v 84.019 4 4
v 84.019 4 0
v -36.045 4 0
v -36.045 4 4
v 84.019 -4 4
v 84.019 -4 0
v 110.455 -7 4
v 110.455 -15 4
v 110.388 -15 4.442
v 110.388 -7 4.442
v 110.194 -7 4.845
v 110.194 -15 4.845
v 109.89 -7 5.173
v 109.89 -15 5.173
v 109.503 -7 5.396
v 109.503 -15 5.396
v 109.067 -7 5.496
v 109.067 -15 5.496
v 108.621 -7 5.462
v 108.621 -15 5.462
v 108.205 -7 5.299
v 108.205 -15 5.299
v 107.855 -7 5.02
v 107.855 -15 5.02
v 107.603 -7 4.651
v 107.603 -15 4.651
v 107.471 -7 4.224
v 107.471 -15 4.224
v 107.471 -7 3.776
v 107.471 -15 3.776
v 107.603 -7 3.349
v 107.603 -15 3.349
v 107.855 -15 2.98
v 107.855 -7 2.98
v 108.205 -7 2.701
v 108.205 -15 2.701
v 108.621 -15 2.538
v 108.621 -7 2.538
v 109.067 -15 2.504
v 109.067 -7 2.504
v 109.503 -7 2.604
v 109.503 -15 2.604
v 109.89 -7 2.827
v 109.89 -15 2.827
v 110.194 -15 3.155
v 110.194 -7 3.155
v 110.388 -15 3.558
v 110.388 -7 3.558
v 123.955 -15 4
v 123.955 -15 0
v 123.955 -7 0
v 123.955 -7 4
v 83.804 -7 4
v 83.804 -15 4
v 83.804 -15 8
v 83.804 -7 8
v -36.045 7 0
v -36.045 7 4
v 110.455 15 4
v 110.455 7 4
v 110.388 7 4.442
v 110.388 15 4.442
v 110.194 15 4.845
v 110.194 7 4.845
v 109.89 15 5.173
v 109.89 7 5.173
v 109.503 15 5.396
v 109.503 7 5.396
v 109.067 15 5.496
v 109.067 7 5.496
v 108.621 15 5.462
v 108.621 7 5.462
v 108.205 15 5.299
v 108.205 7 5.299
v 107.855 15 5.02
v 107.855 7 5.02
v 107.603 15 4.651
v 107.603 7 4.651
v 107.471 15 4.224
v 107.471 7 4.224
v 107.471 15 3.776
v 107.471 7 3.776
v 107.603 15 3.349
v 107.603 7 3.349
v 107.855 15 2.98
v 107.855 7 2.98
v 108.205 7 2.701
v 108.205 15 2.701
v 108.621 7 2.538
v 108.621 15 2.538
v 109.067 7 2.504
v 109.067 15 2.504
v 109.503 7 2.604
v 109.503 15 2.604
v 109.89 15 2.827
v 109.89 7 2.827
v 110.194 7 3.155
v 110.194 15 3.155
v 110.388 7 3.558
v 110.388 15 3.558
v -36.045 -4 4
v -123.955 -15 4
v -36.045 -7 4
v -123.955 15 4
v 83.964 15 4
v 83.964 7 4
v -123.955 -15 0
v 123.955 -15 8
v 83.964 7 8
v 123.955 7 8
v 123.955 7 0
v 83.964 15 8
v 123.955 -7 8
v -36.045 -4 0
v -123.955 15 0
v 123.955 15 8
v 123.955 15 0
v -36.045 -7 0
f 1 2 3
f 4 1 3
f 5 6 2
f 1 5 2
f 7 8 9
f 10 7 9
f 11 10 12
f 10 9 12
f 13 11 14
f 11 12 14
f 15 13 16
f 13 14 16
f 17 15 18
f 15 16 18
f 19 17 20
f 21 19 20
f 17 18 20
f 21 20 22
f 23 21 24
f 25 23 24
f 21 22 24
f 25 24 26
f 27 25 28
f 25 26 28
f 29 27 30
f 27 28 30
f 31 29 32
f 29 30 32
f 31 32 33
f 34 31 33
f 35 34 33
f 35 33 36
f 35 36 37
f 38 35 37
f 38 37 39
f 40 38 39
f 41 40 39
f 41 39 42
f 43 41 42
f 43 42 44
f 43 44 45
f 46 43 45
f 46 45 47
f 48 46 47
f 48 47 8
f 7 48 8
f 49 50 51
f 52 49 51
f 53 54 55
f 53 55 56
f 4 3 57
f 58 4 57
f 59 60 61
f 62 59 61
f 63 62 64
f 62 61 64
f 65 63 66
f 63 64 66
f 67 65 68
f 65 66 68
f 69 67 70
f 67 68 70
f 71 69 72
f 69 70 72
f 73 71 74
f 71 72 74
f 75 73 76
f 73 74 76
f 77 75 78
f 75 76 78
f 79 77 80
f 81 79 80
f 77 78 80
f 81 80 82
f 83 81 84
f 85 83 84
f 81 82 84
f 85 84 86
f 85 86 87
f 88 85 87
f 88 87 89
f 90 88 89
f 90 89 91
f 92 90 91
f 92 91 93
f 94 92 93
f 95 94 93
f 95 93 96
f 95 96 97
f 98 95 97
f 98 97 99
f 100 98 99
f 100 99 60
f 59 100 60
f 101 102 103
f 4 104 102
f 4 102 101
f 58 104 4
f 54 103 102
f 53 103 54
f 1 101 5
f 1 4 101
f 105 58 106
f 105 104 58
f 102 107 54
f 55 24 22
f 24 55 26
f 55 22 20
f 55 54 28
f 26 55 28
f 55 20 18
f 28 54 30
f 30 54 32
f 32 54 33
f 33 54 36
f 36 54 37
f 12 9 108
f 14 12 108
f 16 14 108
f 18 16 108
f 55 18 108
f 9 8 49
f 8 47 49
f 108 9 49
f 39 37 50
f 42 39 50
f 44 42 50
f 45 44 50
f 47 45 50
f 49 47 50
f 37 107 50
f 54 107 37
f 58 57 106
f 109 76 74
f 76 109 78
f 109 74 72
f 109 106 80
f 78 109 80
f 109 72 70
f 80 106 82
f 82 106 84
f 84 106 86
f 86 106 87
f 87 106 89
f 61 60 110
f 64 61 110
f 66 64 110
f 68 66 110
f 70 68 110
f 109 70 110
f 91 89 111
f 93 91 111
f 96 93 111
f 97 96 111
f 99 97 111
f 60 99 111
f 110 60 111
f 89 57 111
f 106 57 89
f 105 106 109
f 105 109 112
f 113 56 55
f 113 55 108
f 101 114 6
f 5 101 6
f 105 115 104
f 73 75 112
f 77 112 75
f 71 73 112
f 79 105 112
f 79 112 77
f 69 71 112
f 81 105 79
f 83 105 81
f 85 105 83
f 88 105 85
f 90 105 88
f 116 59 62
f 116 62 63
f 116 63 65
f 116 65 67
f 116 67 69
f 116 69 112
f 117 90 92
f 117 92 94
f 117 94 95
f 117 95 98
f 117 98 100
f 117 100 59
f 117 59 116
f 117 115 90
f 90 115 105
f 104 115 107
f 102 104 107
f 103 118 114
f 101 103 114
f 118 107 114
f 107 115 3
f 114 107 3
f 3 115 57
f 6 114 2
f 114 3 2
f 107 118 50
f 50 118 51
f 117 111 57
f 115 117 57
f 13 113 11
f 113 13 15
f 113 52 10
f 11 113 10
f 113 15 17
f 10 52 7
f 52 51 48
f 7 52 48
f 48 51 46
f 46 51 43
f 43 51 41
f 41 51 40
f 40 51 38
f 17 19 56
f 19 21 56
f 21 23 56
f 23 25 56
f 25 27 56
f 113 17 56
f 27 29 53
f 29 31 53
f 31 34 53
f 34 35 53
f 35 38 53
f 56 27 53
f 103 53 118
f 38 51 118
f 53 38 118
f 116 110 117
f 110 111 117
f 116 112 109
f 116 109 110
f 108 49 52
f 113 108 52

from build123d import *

# Parameters (mm, degrees)
F1_DEPTH = 4
F2_W     = 39.990724
F2_H     = 8
F2_W_2   = 40.150487
F3_DEPTH = 4
F4_DEPTH = 4
F5_R     = 1.5
F6_DEPTH = 43


with BuildPart() as f1:
    # F0 (on Top) → F1 (new body)
    with BuildSketch(Plane.XY):
        Polygon((-123.954707, -15), (123.954707, -15), (123.954707, -7), (-36.045293, -7), (-36.045293, -4), (84.019206, -4), (84.019206, 4), (83.963744, 4), (83.954707, 4), (-36.045293, 4), (-36.045293, 7), (123.954707, 7), (123.954707, 15), (-123.954707, 15), align=None)
    extrude(amount=F1_DEPTH)

    # F2 (on face) → F3 (join)
    with BuildSketch(Plane.XY.offset(4)):
        with Locations((103.959345, 11)):
            Rectangle(F2_W, F2_H)
        with Locations((103.879463, -11)):
            Rectangle(F2_W_2, F2_H)
    extrude(amount=F3_DEPTH)

    # F2 (on face) → F4 (join)
    with BuildSketch(Plane.XY.offset(4)):
        with Locations((103.959345, 11)):
            Rectangle(F2_W, F2_H)
        with Locations((103.879463, -11)):
            Rectangle(F2_W_2, F2_H)
    extrude(amount=F4_DEPTH)

    # F5 (on face) → F6 (cut)
    with BuildSketch(Plane.XZ.offset(15)):
        with Locations((108.954707, 4)):
            Circle(F5_R)
    extrude(amount=-F6_DEPTH, mode=Mode.SUBTRACT)


solid = f1.part
